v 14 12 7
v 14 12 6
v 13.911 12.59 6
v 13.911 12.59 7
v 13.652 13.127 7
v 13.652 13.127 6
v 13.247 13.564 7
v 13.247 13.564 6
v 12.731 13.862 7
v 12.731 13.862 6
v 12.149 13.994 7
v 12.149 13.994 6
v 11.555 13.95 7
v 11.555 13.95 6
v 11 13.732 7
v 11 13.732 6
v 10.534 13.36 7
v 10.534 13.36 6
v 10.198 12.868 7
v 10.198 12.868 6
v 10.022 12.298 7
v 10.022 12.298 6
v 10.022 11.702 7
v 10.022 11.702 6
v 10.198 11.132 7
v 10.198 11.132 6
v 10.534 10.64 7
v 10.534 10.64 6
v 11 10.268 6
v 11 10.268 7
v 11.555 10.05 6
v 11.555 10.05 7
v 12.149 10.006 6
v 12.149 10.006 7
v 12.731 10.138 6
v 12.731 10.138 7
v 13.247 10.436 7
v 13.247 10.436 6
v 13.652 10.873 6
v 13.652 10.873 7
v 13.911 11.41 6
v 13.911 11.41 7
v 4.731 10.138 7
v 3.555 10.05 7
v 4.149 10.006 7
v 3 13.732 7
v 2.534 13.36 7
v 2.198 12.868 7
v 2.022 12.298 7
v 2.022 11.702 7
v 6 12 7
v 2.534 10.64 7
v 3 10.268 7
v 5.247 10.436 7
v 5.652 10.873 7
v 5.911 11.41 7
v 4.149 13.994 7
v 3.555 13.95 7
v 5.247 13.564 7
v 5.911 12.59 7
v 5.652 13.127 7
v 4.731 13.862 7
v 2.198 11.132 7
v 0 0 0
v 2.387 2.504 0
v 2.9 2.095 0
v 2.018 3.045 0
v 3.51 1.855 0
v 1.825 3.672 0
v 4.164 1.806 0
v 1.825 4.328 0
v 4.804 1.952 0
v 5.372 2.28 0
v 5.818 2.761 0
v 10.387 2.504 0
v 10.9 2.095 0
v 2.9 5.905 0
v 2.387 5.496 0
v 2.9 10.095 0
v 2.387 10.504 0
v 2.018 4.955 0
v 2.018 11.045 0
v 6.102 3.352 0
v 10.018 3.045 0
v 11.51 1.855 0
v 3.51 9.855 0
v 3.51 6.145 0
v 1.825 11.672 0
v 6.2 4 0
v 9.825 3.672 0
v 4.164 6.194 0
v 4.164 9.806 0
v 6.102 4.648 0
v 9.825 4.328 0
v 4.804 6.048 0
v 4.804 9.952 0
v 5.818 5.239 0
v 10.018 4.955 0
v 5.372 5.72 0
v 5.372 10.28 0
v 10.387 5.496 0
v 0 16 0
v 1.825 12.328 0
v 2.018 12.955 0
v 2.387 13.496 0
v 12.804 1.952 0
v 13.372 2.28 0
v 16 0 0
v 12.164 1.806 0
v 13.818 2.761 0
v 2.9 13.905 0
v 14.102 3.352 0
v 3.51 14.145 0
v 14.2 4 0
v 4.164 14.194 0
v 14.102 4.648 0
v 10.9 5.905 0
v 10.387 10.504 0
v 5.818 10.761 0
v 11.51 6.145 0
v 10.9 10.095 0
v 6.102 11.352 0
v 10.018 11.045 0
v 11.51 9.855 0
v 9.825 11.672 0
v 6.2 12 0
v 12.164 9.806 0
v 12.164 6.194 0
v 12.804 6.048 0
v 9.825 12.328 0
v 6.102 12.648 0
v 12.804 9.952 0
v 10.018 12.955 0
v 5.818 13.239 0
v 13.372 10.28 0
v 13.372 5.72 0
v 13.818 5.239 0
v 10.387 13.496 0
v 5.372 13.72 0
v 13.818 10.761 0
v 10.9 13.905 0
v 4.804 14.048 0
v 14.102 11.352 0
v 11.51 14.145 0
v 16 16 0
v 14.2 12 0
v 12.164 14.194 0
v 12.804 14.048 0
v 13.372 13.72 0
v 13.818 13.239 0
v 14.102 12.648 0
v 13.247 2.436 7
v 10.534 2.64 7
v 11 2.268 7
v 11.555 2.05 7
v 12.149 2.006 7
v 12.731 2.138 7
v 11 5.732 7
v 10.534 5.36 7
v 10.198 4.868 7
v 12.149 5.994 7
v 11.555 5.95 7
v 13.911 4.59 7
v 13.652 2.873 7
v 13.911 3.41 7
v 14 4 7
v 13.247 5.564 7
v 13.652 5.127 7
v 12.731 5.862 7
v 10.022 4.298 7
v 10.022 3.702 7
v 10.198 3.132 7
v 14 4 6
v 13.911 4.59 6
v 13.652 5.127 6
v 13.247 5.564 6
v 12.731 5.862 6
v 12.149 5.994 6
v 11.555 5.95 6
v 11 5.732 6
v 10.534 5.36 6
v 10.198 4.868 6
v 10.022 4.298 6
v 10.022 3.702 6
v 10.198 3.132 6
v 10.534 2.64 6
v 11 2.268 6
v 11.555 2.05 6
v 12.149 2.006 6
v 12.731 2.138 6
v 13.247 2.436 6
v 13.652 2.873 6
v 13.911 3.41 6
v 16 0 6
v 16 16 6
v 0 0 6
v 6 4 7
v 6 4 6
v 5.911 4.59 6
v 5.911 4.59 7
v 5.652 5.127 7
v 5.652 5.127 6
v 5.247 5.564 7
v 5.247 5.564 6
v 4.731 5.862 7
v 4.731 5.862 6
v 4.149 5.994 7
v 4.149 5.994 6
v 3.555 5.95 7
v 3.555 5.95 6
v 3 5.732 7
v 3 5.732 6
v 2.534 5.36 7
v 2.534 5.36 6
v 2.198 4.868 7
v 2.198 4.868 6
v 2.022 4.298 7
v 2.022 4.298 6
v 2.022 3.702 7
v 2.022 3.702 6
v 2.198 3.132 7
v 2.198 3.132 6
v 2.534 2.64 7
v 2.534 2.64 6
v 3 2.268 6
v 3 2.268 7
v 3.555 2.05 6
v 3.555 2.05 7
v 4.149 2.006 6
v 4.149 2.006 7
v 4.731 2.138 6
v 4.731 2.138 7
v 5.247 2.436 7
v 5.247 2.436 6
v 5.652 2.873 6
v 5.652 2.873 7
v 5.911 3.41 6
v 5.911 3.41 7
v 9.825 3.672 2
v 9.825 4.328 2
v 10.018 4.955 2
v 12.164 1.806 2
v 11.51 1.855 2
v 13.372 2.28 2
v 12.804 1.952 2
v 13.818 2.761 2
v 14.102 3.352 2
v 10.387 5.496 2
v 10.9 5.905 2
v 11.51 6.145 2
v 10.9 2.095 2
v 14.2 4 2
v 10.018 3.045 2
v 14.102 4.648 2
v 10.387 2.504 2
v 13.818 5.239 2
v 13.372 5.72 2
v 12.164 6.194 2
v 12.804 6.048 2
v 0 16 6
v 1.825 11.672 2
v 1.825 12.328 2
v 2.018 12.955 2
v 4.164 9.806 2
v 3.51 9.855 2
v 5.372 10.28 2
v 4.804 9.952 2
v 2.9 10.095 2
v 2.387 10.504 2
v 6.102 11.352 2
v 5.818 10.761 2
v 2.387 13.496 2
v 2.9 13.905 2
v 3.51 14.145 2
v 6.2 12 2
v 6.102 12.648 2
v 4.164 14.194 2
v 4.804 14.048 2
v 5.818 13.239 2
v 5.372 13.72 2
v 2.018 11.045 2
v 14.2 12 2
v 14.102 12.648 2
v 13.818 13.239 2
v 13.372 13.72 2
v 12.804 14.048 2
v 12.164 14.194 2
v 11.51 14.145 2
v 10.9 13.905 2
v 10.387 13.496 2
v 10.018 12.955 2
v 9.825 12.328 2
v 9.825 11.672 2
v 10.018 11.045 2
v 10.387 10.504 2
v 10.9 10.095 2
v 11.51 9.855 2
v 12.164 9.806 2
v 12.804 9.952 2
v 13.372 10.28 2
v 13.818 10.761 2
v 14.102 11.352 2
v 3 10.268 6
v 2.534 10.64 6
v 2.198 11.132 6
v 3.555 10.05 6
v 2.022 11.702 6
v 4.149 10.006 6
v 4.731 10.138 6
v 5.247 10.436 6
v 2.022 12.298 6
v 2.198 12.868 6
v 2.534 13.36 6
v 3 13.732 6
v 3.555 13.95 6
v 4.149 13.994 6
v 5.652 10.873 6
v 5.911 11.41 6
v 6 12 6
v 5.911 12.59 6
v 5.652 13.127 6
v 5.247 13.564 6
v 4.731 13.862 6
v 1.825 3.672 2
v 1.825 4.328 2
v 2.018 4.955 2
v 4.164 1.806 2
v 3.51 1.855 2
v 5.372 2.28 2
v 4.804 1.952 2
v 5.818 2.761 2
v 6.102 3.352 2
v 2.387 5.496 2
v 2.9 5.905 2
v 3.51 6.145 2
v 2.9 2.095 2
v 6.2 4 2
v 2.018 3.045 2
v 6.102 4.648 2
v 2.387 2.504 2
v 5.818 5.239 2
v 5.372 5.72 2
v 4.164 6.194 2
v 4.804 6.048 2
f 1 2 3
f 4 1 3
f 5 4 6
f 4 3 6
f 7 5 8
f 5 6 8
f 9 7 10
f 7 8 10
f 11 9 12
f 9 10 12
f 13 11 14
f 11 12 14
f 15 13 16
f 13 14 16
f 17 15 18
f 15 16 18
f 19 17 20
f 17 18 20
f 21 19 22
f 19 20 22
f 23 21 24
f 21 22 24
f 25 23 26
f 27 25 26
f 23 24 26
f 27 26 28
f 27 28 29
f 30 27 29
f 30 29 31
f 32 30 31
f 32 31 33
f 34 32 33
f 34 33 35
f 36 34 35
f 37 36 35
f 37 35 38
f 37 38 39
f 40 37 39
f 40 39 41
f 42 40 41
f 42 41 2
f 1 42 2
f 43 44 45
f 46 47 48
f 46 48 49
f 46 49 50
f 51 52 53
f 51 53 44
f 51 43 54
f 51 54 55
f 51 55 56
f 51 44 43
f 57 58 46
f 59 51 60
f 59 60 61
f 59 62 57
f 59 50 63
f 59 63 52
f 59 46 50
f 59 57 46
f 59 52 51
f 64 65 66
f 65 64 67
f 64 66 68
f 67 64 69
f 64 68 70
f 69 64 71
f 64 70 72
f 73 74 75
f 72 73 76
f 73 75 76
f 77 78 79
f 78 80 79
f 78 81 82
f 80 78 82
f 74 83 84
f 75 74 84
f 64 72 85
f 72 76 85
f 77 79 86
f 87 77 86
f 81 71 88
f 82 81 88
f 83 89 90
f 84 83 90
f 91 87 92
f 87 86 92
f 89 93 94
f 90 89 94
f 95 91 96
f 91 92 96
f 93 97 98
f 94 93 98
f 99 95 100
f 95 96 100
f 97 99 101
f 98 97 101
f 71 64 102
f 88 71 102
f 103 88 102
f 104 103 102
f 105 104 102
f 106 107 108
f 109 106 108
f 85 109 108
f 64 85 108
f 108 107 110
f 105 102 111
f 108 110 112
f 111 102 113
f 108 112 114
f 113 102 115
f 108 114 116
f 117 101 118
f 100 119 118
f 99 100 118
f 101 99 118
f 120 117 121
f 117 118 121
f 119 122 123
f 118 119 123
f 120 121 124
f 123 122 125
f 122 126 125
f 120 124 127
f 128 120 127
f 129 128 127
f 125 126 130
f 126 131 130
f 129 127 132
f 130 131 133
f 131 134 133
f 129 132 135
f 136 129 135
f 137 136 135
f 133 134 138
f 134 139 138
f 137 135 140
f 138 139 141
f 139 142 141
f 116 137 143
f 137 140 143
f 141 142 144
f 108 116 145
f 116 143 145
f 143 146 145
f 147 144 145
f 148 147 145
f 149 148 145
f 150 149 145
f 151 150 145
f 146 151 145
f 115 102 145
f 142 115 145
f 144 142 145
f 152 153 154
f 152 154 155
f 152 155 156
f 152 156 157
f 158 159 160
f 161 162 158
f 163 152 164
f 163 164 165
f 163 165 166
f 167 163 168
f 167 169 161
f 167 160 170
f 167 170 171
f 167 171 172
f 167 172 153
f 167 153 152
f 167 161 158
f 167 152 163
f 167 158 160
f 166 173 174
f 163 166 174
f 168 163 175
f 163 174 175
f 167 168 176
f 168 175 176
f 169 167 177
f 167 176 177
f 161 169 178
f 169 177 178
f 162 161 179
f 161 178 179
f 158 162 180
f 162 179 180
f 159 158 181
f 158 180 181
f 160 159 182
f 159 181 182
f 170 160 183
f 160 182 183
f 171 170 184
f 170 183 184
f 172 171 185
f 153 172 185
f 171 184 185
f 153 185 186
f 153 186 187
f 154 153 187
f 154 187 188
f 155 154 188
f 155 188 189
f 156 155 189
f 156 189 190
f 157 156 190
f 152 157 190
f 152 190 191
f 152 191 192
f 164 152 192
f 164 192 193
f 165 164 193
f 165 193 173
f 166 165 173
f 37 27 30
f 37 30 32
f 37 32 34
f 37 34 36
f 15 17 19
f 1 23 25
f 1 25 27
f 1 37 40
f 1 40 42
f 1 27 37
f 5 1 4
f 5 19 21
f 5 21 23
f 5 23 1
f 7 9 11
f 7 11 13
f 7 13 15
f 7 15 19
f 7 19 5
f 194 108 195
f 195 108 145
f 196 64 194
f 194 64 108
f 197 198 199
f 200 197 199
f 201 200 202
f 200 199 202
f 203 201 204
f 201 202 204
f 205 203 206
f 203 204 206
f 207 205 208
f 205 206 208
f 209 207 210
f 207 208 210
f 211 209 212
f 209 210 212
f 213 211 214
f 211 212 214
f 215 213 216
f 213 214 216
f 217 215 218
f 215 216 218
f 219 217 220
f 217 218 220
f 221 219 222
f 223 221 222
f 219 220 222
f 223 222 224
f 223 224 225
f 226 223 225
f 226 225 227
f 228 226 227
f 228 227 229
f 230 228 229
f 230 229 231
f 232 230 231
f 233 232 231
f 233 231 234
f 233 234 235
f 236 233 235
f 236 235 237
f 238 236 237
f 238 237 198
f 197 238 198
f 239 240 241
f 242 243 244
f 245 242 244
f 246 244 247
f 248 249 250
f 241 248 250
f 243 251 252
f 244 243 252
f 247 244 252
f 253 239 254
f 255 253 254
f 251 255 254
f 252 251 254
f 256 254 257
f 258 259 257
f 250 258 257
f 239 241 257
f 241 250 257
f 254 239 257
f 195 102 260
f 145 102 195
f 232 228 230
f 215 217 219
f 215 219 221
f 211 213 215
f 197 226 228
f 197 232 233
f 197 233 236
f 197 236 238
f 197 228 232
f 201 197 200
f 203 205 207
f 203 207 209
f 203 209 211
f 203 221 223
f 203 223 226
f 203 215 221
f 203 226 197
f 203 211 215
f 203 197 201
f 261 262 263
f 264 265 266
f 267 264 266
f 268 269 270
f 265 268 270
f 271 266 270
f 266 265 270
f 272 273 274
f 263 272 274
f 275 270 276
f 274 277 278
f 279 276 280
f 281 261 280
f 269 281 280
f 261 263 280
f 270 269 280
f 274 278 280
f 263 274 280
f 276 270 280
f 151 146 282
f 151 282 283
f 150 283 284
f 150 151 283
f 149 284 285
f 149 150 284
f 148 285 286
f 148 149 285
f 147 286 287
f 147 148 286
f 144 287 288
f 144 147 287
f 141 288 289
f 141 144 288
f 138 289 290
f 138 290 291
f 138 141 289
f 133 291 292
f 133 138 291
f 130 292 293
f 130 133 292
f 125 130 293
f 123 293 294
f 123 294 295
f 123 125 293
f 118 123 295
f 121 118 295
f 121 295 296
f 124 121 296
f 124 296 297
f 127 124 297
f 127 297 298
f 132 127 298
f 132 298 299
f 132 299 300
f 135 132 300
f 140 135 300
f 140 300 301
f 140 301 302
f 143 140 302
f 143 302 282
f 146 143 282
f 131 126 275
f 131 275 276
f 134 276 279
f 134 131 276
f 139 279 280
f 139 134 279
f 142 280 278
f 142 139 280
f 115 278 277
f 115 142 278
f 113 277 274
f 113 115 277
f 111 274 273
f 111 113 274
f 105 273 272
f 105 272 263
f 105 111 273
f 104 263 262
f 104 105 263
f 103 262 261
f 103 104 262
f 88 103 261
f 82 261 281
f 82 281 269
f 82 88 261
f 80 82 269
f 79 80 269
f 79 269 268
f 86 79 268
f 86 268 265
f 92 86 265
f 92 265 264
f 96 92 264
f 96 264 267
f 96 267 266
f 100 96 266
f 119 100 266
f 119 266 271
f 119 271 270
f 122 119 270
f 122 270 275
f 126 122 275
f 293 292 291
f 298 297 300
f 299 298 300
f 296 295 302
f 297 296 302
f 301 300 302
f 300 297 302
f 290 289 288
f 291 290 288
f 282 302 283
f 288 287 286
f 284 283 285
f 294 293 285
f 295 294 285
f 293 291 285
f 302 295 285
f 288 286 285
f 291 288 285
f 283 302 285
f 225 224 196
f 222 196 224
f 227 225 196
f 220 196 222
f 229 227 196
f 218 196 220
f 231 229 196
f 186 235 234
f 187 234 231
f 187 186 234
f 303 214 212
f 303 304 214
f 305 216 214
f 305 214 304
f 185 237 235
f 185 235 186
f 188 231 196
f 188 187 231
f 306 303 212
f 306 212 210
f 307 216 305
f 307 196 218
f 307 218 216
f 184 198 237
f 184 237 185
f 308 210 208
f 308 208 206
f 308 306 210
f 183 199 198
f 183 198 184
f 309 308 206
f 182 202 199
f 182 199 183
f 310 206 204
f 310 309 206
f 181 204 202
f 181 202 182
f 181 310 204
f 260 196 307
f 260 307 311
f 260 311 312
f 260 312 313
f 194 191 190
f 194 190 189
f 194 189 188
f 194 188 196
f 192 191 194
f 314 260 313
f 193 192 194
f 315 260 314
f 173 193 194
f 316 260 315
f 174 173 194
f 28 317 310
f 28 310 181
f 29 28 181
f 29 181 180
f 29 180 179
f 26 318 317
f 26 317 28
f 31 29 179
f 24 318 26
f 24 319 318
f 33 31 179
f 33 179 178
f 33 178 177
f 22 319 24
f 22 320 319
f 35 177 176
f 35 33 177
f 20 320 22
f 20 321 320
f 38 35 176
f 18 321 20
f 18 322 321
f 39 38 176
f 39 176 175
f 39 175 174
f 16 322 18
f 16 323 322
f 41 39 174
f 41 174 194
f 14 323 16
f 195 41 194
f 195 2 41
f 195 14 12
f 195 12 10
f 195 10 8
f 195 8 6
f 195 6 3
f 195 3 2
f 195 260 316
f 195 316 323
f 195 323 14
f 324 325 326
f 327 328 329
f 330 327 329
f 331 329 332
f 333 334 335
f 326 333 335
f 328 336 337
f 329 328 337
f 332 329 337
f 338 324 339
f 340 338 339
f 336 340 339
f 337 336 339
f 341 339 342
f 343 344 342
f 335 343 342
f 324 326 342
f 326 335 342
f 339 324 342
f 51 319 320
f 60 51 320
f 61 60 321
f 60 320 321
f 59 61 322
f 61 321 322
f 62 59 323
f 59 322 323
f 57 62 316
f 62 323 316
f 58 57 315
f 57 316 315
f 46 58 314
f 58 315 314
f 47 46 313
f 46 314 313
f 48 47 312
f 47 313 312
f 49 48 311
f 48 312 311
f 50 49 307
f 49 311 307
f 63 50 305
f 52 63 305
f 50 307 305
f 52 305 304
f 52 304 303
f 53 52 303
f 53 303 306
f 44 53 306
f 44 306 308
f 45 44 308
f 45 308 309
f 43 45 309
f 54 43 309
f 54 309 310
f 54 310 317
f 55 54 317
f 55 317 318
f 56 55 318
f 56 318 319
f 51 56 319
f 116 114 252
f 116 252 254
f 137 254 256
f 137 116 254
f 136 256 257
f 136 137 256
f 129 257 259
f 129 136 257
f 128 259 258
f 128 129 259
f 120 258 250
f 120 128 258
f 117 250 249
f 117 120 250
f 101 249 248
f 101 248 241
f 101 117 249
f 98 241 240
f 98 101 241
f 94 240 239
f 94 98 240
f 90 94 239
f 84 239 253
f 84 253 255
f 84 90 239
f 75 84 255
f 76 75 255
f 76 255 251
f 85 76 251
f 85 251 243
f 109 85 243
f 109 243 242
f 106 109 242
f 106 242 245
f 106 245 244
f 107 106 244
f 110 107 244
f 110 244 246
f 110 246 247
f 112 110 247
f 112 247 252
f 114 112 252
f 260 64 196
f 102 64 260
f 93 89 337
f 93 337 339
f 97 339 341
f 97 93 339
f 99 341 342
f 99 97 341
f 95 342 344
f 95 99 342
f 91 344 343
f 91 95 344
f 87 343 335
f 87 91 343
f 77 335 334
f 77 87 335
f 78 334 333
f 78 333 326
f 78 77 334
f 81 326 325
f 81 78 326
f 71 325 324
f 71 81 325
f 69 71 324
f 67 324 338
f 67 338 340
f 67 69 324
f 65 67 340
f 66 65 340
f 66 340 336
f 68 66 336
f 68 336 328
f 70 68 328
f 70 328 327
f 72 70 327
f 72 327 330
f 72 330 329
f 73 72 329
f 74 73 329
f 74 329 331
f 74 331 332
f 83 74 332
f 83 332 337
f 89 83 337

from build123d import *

# Parameters (mm, degrees)
CYLINDER007_R     = 2.2
CYLINDER007_DEPTH = 7
CYLINDER005_R     = 2.2
CYLINDER005_DEPTH = 7
CYLINDER006_R     = 2.2
CYLINDER006_DEPTH = 7
CYLINDER004_R     = 2.2
CYLINDER004_DEPTH = 7
CYLINDER_R        = 2
CYLINDER_DEPTH    = 7
CYLINDER001_R     = 2
CYLINDER001_DEPTH = 7
CYLINDER002_R     = 2
CYLINDER002_DEPTH = 7
CYLINDER003_R     = 2
CYLINDER003_DEPTH = 7
BOX_W             = 16
BOX_H             = 16
BOX_DEPTH         = 6


with BuildPart() as cylinder007:
    # Cylinder007 → Cylinder007 (new body)
    with BuildSketch(Plane(origin=(12, 12, -5), x_dir=(1, 0, 0), z_dir=(0, 0, 1))):
        Circle(CYLINDER007_R)
    extrude(amount=CYLINDER007_DEPTH)


with BuildPart() as cylinder005:
    # Cylinder005 → Cylinder005 (new body)
    with BuildSketch(Plane(origin=(4, 12, -5), x_dir=(1, 0, 0), z_dir=(0, 0, 1))):
        Circle(CYLINDER005_R)
    extrude(amount=CYLINDER005_DEPTH)


with BuildPart() as cylinder006:
    # Cylinder006 → Cylinder006 (new body)
    with BuildSketch(Plane(origin=(12, 4, -5), x_dir=(1, 0, 0), z_dir=(0, 0, 1))):
        Circle(CYLINDER006_R)
    extrude(amount=CYLINDER006_DEPTH)


with BuildPart() as fusion001:
    # Cylinder004 → Cylinder004 (new body)
    with BuildSketch(Plane(origin=(4, 4, -5), x_dir=(1, 0, 0), z_dir=(0, 0, 1))):
        Circle(CYLINDER004_R)
    extrude(amount=CYLINDER004_DEPTH)

    # Fusion001: union Cylinder007, Cylinder005, Cylinder006
    add(cylinder007.part)
    add(cylinder005.part)
    add(cylinder006.part)


with BuildPart() as cylinder:
    # Cylinder → Cylinder (new body)
    with BuildSketch(Plane(origin=(4, 4, 0), x_dir=(1, 0, 0), z_dir=(0, 0, 1))):
        Circle(CYLINDER_R)
    extrude(amount=CYLINDER_DEPTH)


with BuildPart() as cylinder001:
    # Cylinder001 → Cylinder001 (new body)
    with BuildSketch(Plane(origin=(12, 4, 0), x_dir=(1, 0, 0), z_dir=(0, 0, 1))):
        Circle(CYLINDER001_R)
    extrude(amount=CYLINDER001_DEPTH)


with BuildPart() as cylinder002:
    # Cylinder002 → Cylinder002 (new body)
    with BuildSketch(Plane(origin=(12, 12, 0), x_dir=(1, 0, 0), z_dir=(0, 0, 1))):
        Circle(CYLINDER002_R)
    extrude(amount=CYLINDER002_DEPTH)


with BuildPart() as cylinder003:
    # Cylinder003 → Cylinder003 (new body)
    with BuildSketch(Plane(origin=(4, 12, 0), x_dir=(1, 0, 0), z_dir=(0, 0, 1))):
        Circle(CYLINDER003_R)
    extrude(amount=CYLINDER003_DEPTH)


with BuildPart() as cut:
    # Box → Box (new body)
    with BuildSketch(Plane.XY):
        with Locations((8, 8)):
            Rectangle(BOX_W, BOX_H)
    extrude(amount=BOX_DEPTH)

    # Fusion: union Cylinder, Cylinder001, Cylinder002, Cylinder003
    add(cylinder.part)
    add(cylinder001.part)
    add(cylinder002.part)
    add(cylinder003.part)

    # Cut: cut Fusion001
    add(fusion001.part, mode=Mode.SUBTRACT)


solid = cut.part
